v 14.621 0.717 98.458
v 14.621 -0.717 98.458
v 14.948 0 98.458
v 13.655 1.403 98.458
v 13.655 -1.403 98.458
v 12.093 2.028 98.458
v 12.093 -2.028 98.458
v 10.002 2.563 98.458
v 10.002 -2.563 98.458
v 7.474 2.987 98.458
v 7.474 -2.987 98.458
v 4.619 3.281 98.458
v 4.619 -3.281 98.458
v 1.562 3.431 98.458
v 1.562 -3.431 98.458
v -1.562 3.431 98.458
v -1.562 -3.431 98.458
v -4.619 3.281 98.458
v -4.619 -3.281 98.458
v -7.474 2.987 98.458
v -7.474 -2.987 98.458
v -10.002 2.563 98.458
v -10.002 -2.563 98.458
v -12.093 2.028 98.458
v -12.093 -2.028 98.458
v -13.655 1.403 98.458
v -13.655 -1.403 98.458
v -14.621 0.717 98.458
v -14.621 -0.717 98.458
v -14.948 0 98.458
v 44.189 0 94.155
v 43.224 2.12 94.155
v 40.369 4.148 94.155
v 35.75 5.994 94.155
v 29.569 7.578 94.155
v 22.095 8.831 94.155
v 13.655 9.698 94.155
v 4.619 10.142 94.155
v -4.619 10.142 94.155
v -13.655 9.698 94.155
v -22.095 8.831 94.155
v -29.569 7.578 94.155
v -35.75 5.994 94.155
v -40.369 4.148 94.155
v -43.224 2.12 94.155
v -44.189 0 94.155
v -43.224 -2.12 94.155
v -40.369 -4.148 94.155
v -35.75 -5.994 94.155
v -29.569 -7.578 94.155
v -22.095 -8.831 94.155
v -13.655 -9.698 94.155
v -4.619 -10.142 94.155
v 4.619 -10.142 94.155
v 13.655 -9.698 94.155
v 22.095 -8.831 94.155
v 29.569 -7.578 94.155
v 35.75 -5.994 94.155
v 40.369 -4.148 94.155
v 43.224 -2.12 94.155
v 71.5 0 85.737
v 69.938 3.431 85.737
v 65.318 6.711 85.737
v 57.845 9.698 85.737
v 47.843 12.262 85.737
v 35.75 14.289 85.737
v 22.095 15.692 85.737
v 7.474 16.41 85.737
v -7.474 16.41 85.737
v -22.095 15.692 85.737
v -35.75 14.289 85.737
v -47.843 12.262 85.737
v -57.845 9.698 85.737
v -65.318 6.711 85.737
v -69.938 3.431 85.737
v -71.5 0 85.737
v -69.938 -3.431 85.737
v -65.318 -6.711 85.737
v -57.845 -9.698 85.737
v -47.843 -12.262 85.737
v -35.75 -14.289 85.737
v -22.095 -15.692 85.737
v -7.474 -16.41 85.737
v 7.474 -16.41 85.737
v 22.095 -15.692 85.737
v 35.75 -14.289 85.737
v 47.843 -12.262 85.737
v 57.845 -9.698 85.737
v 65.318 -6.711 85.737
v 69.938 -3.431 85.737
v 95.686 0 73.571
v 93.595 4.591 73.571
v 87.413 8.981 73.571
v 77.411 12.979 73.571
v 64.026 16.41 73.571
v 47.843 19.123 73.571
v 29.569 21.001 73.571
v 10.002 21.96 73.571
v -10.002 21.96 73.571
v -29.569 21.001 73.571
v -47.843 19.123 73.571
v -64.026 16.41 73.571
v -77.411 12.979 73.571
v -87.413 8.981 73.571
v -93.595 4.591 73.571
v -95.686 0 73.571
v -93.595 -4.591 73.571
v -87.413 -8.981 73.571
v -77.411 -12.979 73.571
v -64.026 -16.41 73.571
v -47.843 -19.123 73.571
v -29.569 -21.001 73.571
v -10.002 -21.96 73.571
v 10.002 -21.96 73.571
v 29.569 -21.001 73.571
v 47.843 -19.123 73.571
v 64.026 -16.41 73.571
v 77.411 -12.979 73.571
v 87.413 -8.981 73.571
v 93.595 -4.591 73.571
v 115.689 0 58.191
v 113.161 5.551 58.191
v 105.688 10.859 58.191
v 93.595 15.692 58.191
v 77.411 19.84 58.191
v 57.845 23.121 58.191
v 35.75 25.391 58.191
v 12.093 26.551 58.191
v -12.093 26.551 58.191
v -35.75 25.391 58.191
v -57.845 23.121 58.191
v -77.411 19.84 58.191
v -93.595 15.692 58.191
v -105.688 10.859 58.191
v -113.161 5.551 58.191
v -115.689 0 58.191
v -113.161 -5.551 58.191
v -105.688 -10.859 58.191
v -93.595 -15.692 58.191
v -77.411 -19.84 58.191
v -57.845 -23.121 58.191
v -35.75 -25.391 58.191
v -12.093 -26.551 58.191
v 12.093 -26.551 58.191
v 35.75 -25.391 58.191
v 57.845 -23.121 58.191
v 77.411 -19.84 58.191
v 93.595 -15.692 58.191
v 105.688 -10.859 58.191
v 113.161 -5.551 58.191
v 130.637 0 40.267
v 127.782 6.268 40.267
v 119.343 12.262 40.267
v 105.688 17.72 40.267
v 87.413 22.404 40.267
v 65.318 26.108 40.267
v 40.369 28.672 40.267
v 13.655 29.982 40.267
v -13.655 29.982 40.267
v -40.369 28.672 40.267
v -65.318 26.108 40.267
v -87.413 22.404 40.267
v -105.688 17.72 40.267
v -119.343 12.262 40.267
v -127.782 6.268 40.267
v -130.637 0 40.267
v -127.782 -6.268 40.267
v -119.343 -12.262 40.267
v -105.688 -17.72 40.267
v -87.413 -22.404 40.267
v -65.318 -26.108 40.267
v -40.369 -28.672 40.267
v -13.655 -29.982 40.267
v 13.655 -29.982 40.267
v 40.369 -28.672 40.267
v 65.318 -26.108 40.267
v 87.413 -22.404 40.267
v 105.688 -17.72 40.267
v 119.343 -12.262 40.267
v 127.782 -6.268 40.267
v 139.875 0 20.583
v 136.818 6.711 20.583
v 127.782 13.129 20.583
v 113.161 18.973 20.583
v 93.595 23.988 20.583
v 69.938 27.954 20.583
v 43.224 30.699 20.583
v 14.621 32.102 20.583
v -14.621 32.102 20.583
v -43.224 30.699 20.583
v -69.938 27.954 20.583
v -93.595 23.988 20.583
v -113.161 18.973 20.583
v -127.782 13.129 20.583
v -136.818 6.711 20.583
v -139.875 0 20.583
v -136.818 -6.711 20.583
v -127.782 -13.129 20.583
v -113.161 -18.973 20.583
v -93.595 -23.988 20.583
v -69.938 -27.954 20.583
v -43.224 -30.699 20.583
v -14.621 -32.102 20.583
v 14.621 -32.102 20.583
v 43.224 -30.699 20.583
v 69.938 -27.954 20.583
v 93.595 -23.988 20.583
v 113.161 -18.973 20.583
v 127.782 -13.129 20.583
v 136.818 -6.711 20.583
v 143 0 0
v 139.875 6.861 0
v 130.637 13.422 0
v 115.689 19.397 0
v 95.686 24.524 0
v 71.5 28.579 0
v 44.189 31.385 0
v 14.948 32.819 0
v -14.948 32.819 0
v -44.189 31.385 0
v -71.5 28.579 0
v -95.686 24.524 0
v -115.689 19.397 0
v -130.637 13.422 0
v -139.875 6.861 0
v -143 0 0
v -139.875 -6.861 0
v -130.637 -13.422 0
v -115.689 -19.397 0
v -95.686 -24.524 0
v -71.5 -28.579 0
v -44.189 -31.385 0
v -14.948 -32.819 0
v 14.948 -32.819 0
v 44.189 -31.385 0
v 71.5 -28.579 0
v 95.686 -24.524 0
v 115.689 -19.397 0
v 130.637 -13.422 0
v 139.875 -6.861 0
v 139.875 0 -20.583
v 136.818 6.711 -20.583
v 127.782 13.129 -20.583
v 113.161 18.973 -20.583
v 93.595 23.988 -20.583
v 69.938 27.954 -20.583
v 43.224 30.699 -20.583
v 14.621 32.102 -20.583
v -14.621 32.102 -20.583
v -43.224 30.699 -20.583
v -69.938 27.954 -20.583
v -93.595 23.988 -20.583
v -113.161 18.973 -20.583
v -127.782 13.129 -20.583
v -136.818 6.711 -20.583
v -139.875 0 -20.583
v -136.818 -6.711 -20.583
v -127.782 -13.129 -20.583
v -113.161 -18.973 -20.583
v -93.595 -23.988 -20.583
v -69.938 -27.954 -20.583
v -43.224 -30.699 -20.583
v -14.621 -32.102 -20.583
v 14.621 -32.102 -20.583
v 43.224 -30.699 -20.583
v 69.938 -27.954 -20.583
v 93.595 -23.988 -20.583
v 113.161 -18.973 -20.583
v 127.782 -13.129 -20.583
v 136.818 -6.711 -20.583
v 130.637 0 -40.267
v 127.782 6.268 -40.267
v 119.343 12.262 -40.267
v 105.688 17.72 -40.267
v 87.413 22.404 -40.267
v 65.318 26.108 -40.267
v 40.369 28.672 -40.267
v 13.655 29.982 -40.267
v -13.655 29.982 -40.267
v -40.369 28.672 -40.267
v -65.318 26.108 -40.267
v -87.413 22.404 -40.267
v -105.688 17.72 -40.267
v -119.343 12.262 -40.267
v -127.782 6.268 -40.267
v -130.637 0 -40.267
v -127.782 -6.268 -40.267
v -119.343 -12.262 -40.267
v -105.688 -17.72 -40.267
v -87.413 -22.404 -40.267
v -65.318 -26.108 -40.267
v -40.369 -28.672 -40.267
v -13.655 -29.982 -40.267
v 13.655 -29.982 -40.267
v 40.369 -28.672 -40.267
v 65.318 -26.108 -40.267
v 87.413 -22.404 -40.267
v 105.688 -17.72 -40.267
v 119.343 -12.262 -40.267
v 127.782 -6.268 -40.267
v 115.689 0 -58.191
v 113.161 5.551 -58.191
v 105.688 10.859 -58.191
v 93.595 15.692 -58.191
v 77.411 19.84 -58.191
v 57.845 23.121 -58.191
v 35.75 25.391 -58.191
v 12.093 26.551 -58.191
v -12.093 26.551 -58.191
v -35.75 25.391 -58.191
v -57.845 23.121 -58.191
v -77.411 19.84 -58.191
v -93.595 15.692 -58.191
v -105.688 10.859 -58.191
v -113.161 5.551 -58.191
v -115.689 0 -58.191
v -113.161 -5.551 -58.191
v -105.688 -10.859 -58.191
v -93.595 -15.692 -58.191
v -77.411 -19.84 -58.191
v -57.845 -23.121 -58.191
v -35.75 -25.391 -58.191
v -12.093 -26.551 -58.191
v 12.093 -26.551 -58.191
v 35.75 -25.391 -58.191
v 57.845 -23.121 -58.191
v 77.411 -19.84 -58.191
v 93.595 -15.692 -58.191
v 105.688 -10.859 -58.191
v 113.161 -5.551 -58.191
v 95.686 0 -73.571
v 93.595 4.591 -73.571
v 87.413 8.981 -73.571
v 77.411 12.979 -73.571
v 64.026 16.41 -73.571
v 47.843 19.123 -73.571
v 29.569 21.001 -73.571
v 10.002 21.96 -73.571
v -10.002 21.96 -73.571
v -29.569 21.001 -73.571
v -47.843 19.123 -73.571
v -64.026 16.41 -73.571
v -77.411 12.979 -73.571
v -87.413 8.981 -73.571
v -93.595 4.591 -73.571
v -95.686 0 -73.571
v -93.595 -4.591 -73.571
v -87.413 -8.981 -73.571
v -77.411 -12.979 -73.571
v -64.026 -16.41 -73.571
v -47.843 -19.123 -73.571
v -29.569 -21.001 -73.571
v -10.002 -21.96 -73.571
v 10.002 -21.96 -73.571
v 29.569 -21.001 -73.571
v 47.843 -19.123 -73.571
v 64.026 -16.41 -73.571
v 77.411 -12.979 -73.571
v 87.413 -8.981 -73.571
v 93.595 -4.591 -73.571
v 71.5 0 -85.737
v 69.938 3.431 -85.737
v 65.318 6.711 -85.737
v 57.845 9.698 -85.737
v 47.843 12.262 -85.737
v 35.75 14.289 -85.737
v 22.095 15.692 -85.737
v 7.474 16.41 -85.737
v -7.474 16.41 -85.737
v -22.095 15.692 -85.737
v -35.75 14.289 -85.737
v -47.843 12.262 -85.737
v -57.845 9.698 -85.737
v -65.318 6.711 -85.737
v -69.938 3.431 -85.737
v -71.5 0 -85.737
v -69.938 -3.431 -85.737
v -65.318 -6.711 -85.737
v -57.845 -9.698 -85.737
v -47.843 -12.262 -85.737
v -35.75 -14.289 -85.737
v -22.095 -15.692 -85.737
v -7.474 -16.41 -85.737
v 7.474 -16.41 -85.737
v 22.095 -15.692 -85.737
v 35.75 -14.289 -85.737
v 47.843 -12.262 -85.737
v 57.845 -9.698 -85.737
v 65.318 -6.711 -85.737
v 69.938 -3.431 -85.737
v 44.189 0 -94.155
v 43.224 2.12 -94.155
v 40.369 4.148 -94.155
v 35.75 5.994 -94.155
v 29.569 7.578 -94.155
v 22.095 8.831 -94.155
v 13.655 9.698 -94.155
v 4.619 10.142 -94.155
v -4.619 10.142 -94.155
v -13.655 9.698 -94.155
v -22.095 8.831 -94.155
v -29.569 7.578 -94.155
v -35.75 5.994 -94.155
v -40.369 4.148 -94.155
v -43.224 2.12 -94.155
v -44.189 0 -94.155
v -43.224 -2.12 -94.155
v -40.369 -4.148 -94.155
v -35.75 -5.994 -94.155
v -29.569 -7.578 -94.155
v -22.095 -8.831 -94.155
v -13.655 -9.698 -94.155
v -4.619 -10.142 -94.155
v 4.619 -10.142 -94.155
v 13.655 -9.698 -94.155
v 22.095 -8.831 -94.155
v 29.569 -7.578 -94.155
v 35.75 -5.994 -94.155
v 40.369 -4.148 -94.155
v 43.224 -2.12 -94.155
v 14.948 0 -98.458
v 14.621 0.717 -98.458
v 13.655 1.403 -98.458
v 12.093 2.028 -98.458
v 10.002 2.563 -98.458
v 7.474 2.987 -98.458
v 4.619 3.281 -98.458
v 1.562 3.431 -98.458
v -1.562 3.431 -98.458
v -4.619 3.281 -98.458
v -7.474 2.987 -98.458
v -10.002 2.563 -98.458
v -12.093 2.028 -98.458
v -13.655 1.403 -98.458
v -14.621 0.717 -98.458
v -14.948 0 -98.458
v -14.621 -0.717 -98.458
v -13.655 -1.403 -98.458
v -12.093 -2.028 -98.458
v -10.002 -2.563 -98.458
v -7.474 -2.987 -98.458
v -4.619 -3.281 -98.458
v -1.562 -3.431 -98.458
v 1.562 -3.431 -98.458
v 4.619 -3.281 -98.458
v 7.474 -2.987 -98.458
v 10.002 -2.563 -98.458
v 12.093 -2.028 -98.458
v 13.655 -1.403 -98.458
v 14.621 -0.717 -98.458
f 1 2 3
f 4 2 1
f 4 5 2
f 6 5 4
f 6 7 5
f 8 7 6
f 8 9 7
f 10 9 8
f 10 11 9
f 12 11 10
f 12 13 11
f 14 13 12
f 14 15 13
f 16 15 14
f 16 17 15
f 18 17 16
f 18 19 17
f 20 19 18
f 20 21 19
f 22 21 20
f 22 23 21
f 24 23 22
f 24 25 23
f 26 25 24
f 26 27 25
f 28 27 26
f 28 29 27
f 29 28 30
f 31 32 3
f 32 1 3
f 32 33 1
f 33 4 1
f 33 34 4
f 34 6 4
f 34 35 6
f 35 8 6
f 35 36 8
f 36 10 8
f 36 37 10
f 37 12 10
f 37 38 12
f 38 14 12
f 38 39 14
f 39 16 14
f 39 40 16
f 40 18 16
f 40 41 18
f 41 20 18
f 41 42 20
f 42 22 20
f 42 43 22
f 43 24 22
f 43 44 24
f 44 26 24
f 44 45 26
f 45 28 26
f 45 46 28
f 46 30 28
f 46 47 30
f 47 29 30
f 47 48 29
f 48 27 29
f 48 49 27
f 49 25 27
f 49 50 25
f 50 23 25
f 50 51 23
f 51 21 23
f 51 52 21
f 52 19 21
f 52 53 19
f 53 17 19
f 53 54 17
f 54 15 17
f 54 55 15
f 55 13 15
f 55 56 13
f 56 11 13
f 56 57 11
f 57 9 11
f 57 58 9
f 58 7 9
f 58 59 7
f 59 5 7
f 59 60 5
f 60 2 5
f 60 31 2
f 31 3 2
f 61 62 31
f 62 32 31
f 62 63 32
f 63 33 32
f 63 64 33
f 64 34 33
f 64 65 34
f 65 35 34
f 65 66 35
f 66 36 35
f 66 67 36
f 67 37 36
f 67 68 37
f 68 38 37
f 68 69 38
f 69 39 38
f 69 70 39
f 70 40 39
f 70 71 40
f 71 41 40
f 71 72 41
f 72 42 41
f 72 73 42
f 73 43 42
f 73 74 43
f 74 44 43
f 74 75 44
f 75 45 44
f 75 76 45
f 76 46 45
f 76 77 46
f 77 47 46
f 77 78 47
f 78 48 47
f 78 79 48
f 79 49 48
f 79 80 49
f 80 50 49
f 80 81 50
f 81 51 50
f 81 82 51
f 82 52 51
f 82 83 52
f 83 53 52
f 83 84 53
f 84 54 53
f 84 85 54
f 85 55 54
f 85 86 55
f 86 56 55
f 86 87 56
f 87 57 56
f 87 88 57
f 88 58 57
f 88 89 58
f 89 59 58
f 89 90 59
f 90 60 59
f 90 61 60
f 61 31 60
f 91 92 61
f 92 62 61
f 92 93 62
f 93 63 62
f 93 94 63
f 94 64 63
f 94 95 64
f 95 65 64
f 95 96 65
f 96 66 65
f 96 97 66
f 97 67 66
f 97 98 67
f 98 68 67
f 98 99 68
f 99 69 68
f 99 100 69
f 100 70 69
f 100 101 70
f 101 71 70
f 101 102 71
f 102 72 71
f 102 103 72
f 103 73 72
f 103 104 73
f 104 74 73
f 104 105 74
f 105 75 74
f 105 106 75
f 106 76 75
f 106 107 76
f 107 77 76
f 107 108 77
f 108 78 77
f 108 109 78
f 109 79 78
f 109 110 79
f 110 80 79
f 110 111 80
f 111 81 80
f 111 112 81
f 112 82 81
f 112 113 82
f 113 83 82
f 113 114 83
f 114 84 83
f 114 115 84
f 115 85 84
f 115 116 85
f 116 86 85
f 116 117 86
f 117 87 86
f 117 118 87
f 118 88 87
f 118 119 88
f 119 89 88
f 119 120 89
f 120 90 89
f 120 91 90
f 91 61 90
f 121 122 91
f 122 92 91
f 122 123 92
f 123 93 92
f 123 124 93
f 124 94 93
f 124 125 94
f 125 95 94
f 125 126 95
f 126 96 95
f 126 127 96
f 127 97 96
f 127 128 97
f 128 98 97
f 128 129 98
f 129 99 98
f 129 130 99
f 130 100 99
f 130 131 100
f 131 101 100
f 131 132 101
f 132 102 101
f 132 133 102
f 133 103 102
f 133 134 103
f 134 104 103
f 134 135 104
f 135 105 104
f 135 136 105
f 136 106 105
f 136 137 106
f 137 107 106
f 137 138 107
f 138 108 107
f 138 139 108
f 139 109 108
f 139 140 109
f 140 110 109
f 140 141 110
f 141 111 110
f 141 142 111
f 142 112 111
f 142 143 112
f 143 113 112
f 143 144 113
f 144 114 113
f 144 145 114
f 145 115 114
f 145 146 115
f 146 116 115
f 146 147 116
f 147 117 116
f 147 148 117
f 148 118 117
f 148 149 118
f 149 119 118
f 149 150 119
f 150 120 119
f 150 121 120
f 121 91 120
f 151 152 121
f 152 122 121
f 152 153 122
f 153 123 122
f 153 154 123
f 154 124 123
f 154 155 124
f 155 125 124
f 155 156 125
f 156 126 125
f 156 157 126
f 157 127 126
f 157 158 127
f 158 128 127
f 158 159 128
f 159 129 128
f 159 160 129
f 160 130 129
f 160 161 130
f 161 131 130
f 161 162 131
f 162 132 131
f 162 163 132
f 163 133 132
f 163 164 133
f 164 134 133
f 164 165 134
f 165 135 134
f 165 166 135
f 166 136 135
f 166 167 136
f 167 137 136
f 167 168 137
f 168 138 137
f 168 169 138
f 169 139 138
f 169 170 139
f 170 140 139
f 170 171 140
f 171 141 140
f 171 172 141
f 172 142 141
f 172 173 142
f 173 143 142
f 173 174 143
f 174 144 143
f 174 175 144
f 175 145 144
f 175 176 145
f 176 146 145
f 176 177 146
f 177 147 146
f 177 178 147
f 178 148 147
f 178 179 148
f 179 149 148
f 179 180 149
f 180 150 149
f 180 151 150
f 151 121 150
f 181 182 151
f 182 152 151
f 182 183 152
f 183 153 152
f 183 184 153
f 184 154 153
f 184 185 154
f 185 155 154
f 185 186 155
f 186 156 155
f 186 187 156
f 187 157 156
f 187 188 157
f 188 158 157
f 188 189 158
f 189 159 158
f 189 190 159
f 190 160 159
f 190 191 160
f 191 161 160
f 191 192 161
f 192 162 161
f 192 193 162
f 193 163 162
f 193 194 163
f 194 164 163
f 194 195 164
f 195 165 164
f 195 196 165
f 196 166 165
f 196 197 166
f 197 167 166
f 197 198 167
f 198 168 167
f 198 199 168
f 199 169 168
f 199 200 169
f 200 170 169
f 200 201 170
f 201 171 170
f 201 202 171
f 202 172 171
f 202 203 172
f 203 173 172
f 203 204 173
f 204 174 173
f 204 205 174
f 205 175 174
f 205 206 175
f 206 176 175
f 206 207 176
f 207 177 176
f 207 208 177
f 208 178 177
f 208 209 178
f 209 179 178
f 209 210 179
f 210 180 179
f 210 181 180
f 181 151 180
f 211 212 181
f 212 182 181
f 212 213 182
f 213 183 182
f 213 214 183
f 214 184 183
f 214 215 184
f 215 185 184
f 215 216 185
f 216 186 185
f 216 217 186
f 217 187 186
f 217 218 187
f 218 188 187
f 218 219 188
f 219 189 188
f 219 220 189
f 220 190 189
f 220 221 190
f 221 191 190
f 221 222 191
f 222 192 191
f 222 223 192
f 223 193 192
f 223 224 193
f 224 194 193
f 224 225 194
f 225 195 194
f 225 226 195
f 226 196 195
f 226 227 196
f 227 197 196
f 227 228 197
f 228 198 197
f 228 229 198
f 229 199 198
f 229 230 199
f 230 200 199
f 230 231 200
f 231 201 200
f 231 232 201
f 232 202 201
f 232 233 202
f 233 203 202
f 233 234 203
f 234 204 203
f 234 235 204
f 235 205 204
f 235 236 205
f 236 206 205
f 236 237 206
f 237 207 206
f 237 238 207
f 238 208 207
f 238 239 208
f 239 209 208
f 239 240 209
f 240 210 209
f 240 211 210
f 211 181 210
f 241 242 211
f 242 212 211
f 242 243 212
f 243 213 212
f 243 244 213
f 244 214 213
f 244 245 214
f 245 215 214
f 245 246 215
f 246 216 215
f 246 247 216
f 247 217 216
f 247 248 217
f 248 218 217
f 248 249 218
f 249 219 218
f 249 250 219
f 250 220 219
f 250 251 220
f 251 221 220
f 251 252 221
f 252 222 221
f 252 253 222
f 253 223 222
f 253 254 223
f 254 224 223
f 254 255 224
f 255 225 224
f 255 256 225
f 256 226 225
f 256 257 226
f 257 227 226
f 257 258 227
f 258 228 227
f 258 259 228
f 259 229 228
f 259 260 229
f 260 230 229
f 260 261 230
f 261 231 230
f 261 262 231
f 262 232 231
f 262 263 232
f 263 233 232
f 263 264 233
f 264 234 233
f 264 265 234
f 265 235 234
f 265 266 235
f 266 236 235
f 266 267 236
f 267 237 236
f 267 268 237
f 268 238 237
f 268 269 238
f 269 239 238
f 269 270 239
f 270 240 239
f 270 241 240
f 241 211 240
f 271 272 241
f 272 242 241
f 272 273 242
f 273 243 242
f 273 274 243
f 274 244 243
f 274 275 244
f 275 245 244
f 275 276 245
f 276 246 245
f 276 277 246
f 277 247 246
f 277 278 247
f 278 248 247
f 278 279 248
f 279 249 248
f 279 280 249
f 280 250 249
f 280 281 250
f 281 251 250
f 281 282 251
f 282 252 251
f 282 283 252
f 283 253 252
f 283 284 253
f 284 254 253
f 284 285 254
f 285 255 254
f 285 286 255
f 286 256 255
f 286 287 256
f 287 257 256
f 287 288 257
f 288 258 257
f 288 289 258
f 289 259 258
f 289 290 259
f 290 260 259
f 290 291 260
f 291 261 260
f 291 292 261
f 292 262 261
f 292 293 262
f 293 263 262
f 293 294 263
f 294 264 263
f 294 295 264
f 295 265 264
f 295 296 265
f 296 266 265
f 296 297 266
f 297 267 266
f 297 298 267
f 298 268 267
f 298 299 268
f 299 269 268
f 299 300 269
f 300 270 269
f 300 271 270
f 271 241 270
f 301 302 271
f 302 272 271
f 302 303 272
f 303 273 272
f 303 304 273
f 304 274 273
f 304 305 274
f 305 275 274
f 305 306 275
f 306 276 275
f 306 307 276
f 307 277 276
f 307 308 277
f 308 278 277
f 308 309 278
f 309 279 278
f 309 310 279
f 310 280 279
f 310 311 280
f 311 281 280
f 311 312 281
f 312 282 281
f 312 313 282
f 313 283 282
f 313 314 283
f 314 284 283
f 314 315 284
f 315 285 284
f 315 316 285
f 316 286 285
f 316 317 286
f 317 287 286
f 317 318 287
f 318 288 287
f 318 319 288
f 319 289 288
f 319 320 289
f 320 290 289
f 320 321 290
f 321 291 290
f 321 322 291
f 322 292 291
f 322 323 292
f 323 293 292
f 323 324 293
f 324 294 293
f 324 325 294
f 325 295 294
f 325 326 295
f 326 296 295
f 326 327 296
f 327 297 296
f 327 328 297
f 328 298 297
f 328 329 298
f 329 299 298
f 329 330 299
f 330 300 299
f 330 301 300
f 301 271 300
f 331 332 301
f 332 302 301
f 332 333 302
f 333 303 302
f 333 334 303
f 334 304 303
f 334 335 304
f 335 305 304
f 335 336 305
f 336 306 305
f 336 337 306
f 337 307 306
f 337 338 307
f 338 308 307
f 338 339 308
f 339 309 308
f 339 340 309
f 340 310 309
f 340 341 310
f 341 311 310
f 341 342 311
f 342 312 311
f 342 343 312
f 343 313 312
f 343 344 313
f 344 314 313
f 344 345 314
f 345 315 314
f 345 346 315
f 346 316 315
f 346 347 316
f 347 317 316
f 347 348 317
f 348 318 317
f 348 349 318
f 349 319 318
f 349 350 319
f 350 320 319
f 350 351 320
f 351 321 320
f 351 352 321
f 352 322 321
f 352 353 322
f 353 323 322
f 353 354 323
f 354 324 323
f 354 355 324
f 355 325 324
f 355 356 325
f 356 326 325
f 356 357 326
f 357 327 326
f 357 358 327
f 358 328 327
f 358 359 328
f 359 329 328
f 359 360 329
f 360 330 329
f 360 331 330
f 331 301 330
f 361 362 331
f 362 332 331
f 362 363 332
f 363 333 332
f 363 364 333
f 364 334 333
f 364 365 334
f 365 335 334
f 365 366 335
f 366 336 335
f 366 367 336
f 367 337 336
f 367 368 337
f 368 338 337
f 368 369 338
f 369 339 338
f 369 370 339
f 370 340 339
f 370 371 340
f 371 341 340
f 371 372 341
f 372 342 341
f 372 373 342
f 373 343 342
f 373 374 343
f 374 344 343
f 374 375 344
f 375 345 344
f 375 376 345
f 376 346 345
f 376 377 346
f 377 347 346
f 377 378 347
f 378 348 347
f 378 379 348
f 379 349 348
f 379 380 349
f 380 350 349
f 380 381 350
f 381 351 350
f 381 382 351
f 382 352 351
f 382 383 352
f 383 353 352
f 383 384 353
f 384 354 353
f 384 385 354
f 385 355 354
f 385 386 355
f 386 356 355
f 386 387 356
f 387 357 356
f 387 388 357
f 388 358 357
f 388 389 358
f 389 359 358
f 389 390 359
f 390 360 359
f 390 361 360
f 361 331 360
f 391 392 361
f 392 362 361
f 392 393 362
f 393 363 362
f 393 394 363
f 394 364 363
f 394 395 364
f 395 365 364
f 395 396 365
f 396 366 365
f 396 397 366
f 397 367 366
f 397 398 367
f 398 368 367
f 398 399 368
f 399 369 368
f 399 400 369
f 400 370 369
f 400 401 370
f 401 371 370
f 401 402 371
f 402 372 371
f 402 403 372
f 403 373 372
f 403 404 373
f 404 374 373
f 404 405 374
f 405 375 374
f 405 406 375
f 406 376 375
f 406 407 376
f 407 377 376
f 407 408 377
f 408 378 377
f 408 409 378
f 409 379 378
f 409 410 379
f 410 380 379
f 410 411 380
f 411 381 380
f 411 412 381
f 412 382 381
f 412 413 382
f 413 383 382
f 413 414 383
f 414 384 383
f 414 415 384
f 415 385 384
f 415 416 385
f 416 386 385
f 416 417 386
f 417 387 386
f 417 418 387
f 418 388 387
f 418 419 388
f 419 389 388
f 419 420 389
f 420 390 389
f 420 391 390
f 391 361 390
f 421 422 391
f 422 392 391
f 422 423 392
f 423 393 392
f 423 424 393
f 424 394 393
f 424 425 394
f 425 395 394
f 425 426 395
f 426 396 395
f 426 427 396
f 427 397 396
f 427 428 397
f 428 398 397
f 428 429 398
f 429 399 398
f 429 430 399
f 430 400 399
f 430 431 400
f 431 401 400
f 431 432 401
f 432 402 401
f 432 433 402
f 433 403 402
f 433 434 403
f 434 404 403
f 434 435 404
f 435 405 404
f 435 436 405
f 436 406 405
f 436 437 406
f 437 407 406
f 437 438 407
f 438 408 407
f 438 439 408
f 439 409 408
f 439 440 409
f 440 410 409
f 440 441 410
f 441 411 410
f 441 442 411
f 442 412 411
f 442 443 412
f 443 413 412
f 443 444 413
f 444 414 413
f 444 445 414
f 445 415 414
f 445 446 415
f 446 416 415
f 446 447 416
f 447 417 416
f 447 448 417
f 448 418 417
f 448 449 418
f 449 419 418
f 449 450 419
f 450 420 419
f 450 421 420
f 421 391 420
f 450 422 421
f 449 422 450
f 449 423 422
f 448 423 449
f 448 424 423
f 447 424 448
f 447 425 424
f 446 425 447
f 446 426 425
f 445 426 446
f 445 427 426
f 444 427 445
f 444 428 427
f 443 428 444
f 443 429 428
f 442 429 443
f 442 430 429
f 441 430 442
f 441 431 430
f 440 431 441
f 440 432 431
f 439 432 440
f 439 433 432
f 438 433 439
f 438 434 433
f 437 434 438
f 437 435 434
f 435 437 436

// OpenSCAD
// Generated by SolidPython 1.0.1 on 2020-07-29 00:46:50


scale(v = [13, 3, 9]) {
	sphere(r = 11);
}
/***********************************************
*********      SolidPython code:      **********
************************************************
 
# import packages: SolidPython
from solid import *
from solid.utils import *
from itertools import chain, combinations, permutations


class Resize:

    def __init__(self, scad_file):
        self.scad_file = scad_file
        #self.scad_file = import_scad(scad_file)
        # cone/cylinder param:
        self.r1 = 0
        self.r2 = 0
        self.h = 0
        # rectangular prism param:
        self.w = 0
        self.l = 0
        # ellipse param:
        self.r = 0

    # import OpenScad code (file name corresponds to shape)


    # classify shape + parameters
    def assign(self, param1, param2, param3):
        if self.scad_file == 'cone.scad':
            self.r1 = param1
            self.r2 = param2
            self.h = param3
        elif self.scad_file == 'cylinder.scad':
            self.r1 = param1
            self.r2 = param2
            self.h = param3
        elif self.scad_file == 'rectangularPrism.scad':
            self.h = param1
            self.l = param2
            self.w = param3
        else:
            self.r = param1
            self.h = param2

    # resize parameters
    def iterate(self):
        x = range(3, 20, 2)
        i = 1
        if self.scad_file == 'cone.scad':
            tempList = list(permutations(x, 2))
            for temp in tempList:
                param1 = temp[0]
                param2 = temp[1]
                filepath = 'produced_scad_files/' + 'cone' + str(param1) + '_' + str(param2) + '_' + '.scad'
                scad_render_to_file(cylinder(h=param1, r1=param2, r2=0), filepath)

        elif self.scad_file == 'cylinder.scad':
            tempList = list(permutations(x, 3))
            for temp in tempList:
                param1 = temp[0]
                param2 = temp[1]
                filepath = 'produced_scad_files/' + 'cylinder' + str(param1) + '_' + str(param2) + '_' + '.scad'
                scad_render_to_file(cylinder(h=param1, r1=param2, r2=param2), filepath)

        elif self.scad_file == 'rectangularPrism.scad':
            tempList = list(permutations(x, 3))
            for temp in tempList:
                param1 = temp[0]
                param2 = temp[1]
                param3 = temp[2]
                filepath = 'produced_scad_files/' + 'rectangularPrism' + str(param1) + '_' + str(param2) + '_' + str(
                    param3) + '.scad'
                scad_render_to_file(cube(size=(param1, param2, param3)), filepath)

        elif self.scad_file == 'ellipse.scad':
            tempList = list(permutations(x, 4))
            for temp in tempList:
                param1 = temp[0]
                param2 = temp[1]
                param3 = temp[2]
                param4 = temp[3]
                filepath = 'produced_scad_files/' + 'ellipse' + str(param1) + '_' + str(param2) + '_' + str(param3) + '_' + str(param4) + '.scad'
                scad_render_to_file(scale([param1, param2, param3])(sphere(r=param4)), filepath)

    def render_to_scadfile(self):
        scad_render_to_file(scad, 'example.scad') 
 
************************************************/
